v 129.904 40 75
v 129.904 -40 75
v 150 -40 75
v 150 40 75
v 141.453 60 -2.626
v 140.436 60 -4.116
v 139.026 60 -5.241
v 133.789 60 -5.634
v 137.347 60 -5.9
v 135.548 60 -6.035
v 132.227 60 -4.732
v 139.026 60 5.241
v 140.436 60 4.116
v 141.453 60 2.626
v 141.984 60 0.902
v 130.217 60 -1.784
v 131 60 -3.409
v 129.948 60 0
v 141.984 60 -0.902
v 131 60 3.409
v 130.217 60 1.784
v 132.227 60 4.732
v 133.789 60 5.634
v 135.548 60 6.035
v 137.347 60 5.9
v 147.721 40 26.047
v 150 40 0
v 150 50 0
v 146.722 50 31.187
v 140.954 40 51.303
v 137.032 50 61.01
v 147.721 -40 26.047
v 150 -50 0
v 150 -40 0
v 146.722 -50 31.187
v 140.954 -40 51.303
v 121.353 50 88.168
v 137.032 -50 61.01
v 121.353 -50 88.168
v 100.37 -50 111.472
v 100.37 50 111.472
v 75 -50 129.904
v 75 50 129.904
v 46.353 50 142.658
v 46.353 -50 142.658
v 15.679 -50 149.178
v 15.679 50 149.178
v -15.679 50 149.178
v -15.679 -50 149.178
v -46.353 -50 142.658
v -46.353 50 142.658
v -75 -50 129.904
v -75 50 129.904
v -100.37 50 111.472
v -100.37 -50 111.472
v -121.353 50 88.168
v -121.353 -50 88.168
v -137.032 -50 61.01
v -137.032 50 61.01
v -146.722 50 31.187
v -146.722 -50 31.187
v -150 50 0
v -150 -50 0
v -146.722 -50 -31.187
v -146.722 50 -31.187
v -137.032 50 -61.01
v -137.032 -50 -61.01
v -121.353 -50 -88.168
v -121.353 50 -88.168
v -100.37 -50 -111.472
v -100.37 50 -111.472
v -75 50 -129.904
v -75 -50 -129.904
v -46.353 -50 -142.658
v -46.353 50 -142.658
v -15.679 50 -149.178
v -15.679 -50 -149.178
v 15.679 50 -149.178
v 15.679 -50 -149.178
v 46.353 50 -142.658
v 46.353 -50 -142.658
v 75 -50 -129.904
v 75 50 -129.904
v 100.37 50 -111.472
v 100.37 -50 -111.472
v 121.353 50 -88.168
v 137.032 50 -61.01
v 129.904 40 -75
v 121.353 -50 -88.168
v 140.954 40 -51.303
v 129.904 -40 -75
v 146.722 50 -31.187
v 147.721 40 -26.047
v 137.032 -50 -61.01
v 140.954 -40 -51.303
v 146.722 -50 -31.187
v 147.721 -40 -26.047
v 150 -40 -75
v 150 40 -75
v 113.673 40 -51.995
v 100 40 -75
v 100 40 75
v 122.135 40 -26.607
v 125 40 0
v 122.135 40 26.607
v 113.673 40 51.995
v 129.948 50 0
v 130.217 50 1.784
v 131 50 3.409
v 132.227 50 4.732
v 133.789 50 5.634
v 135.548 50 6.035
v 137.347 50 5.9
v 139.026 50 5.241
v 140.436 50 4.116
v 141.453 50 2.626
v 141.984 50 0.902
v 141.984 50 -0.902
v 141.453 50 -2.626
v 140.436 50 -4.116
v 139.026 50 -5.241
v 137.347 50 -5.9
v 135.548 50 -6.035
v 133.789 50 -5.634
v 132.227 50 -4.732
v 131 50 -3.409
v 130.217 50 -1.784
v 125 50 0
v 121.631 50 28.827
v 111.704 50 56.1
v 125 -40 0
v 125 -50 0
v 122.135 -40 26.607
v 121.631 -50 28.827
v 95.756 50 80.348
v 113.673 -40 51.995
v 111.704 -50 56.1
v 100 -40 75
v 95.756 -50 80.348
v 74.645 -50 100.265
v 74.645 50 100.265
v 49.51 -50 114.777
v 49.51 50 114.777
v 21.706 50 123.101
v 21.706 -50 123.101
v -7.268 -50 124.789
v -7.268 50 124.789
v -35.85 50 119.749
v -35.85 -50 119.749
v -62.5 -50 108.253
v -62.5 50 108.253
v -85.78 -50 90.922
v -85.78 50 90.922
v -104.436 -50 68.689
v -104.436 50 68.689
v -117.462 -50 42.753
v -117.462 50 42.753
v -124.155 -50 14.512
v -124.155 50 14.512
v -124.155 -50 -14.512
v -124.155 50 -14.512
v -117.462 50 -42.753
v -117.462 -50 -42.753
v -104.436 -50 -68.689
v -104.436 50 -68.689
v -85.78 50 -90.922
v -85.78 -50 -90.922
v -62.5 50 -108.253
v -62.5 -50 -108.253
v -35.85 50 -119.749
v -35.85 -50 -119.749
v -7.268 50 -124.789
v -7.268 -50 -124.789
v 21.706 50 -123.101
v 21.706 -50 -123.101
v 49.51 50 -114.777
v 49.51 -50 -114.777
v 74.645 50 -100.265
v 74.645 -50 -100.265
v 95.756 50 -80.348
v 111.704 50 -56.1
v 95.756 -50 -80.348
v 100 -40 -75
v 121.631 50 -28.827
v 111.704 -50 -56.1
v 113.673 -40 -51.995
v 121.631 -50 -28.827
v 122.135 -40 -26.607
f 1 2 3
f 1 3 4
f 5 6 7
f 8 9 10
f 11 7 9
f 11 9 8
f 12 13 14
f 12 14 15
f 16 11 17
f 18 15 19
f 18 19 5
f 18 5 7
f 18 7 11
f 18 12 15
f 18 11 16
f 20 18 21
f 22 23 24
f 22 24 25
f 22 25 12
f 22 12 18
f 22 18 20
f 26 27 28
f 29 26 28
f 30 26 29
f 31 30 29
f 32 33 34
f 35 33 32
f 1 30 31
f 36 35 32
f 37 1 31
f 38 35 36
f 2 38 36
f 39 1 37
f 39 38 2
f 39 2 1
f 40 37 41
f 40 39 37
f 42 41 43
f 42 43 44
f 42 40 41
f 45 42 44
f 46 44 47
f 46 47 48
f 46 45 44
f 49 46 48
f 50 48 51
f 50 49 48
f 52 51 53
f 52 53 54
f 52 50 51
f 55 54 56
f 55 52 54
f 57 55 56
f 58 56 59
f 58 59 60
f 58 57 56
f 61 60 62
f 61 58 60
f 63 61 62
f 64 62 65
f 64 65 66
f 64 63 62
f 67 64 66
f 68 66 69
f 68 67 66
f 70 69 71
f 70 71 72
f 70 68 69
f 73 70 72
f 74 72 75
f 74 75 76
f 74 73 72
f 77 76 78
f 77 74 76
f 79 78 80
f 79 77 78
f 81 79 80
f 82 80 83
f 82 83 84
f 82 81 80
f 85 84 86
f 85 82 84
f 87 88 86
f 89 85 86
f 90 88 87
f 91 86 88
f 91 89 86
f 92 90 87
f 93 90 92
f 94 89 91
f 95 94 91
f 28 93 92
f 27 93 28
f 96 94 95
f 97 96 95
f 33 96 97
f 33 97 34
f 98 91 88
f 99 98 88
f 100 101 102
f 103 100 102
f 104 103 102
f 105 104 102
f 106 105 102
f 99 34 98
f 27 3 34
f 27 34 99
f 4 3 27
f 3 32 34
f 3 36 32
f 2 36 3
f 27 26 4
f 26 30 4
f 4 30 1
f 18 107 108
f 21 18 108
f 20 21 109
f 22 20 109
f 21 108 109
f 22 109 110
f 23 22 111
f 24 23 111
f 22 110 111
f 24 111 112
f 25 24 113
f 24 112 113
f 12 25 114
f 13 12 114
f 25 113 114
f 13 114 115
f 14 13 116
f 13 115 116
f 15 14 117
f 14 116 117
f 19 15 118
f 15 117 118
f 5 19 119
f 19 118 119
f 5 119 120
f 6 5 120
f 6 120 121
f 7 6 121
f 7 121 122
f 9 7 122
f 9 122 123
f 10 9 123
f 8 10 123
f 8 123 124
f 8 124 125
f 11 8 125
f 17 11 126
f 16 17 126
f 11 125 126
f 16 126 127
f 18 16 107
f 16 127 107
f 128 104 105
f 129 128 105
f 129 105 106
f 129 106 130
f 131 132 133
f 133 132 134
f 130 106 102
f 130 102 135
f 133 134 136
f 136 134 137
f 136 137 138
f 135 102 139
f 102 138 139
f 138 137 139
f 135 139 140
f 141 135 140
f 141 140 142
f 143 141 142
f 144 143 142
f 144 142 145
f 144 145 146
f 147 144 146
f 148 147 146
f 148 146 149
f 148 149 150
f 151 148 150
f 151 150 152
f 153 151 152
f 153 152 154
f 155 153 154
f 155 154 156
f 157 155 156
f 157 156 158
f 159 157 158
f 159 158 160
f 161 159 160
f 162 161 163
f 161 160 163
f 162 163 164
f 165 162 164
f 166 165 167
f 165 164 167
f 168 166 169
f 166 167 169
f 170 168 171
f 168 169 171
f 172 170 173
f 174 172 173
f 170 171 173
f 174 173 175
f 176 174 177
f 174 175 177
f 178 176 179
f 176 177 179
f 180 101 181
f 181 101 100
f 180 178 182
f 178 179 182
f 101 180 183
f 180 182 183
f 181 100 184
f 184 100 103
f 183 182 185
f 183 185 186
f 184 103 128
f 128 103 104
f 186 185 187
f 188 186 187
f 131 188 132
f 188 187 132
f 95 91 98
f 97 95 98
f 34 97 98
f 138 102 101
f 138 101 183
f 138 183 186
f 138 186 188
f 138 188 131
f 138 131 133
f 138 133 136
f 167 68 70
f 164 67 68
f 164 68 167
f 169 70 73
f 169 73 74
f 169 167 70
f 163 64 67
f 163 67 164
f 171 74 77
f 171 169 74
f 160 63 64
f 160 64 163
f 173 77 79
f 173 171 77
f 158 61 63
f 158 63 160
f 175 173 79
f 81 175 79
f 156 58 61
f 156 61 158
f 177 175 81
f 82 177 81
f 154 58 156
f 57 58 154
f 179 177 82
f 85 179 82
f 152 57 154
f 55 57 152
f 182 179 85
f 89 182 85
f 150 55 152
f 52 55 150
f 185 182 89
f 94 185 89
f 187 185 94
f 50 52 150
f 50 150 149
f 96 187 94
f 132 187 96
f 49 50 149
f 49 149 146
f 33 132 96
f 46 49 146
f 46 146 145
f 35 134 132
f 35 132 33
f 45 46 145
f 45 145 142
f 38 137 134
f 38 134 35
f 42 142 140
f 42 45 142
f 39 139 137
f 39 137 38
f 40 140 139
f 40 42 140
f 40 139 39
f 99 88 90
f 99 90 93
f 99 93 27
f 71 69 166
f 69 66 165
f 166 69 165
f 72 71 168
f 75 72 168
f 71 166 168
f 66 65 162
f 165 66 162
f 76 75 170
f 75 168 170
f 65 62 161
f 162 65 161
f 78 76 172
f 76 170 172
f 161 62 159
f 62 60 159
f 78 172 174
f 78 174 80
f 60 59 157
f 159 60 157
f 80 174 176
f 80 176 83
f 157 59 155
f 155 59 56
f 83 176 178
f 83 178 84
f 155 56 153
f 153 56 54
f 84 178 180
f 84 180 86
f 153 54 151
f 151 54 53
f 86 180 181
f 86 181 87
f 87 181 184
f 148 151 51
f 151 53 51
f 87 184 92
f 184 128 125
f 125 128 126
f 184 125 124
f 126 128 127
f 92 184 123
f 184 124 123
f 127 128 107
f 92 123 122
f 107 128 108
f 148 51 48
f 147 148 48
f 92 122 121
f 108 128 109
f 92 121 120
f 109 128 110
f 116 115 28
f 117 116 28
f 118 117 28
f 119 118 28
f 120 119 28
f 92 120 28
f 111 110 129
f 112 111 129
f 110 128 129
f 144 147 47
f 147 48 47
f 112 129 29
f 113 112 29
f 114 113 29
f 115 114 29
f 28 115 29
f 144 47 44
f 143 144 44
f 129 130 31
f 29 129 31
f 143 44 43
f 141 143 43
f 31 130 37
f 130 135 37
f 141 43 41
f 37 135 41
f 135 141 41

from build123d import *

# Parameters (mm, degrees)
F0_R     = 150
F1_DEPTH = 50
F2_R     = 125
F3_DEPTH = 100
F4_W     = 80
F4_H     = 150
F5_DEPTH = 150
F6_W     = 80
F6_H     = 150
F7_DEPTH = 100
F8_R     = 6.051989
F9_DEPTH = 10


with BuildPart() as f1:
    # F0 (on Front) → F1 (new body, symmetric)
    with BuildSketch(Plane.XZ):
        Circle(F0_R)
    extrude(amount=F1_DEPTH, both=True)

    # F2 (on face) → F3 (cut, through all)
    with BuildSketch(Plane.XZ.offset(50)):
        Circle(F2_R)
    extrude(amount=-F3_DEPTH, mode=Mode.SUBTRACT)

    # F4 (on Right) → F5 (join)
    with BuildSketch(Plane.YZ):
        Rectangle(F4_W, F4_H)
    extrude(amount=F5_DEPTH)

    # F6 (on face) → F7 (cut)
    with BuildSketch(Plane(origin=(0, 0, 0), x_dir=(0, -1, 0), z_dir=(-1, 0, 0))):
        Rectangle(F6_W, F6_H)
    extrude(amount=-F7_DEPTH, mode=Mode.SUBTRACT)

    # F8 (on face) → F9 (join)
    with BuildSketch(Plane(origin=(0, 50, 0), x_dir=(-1, 0, 0), z_dir=(0, 1, 0))):
        with Locations((-136, 0)):
            Circle(F8_R)
    extrude(amount=F9_DEPTH)


solid = f1.part
